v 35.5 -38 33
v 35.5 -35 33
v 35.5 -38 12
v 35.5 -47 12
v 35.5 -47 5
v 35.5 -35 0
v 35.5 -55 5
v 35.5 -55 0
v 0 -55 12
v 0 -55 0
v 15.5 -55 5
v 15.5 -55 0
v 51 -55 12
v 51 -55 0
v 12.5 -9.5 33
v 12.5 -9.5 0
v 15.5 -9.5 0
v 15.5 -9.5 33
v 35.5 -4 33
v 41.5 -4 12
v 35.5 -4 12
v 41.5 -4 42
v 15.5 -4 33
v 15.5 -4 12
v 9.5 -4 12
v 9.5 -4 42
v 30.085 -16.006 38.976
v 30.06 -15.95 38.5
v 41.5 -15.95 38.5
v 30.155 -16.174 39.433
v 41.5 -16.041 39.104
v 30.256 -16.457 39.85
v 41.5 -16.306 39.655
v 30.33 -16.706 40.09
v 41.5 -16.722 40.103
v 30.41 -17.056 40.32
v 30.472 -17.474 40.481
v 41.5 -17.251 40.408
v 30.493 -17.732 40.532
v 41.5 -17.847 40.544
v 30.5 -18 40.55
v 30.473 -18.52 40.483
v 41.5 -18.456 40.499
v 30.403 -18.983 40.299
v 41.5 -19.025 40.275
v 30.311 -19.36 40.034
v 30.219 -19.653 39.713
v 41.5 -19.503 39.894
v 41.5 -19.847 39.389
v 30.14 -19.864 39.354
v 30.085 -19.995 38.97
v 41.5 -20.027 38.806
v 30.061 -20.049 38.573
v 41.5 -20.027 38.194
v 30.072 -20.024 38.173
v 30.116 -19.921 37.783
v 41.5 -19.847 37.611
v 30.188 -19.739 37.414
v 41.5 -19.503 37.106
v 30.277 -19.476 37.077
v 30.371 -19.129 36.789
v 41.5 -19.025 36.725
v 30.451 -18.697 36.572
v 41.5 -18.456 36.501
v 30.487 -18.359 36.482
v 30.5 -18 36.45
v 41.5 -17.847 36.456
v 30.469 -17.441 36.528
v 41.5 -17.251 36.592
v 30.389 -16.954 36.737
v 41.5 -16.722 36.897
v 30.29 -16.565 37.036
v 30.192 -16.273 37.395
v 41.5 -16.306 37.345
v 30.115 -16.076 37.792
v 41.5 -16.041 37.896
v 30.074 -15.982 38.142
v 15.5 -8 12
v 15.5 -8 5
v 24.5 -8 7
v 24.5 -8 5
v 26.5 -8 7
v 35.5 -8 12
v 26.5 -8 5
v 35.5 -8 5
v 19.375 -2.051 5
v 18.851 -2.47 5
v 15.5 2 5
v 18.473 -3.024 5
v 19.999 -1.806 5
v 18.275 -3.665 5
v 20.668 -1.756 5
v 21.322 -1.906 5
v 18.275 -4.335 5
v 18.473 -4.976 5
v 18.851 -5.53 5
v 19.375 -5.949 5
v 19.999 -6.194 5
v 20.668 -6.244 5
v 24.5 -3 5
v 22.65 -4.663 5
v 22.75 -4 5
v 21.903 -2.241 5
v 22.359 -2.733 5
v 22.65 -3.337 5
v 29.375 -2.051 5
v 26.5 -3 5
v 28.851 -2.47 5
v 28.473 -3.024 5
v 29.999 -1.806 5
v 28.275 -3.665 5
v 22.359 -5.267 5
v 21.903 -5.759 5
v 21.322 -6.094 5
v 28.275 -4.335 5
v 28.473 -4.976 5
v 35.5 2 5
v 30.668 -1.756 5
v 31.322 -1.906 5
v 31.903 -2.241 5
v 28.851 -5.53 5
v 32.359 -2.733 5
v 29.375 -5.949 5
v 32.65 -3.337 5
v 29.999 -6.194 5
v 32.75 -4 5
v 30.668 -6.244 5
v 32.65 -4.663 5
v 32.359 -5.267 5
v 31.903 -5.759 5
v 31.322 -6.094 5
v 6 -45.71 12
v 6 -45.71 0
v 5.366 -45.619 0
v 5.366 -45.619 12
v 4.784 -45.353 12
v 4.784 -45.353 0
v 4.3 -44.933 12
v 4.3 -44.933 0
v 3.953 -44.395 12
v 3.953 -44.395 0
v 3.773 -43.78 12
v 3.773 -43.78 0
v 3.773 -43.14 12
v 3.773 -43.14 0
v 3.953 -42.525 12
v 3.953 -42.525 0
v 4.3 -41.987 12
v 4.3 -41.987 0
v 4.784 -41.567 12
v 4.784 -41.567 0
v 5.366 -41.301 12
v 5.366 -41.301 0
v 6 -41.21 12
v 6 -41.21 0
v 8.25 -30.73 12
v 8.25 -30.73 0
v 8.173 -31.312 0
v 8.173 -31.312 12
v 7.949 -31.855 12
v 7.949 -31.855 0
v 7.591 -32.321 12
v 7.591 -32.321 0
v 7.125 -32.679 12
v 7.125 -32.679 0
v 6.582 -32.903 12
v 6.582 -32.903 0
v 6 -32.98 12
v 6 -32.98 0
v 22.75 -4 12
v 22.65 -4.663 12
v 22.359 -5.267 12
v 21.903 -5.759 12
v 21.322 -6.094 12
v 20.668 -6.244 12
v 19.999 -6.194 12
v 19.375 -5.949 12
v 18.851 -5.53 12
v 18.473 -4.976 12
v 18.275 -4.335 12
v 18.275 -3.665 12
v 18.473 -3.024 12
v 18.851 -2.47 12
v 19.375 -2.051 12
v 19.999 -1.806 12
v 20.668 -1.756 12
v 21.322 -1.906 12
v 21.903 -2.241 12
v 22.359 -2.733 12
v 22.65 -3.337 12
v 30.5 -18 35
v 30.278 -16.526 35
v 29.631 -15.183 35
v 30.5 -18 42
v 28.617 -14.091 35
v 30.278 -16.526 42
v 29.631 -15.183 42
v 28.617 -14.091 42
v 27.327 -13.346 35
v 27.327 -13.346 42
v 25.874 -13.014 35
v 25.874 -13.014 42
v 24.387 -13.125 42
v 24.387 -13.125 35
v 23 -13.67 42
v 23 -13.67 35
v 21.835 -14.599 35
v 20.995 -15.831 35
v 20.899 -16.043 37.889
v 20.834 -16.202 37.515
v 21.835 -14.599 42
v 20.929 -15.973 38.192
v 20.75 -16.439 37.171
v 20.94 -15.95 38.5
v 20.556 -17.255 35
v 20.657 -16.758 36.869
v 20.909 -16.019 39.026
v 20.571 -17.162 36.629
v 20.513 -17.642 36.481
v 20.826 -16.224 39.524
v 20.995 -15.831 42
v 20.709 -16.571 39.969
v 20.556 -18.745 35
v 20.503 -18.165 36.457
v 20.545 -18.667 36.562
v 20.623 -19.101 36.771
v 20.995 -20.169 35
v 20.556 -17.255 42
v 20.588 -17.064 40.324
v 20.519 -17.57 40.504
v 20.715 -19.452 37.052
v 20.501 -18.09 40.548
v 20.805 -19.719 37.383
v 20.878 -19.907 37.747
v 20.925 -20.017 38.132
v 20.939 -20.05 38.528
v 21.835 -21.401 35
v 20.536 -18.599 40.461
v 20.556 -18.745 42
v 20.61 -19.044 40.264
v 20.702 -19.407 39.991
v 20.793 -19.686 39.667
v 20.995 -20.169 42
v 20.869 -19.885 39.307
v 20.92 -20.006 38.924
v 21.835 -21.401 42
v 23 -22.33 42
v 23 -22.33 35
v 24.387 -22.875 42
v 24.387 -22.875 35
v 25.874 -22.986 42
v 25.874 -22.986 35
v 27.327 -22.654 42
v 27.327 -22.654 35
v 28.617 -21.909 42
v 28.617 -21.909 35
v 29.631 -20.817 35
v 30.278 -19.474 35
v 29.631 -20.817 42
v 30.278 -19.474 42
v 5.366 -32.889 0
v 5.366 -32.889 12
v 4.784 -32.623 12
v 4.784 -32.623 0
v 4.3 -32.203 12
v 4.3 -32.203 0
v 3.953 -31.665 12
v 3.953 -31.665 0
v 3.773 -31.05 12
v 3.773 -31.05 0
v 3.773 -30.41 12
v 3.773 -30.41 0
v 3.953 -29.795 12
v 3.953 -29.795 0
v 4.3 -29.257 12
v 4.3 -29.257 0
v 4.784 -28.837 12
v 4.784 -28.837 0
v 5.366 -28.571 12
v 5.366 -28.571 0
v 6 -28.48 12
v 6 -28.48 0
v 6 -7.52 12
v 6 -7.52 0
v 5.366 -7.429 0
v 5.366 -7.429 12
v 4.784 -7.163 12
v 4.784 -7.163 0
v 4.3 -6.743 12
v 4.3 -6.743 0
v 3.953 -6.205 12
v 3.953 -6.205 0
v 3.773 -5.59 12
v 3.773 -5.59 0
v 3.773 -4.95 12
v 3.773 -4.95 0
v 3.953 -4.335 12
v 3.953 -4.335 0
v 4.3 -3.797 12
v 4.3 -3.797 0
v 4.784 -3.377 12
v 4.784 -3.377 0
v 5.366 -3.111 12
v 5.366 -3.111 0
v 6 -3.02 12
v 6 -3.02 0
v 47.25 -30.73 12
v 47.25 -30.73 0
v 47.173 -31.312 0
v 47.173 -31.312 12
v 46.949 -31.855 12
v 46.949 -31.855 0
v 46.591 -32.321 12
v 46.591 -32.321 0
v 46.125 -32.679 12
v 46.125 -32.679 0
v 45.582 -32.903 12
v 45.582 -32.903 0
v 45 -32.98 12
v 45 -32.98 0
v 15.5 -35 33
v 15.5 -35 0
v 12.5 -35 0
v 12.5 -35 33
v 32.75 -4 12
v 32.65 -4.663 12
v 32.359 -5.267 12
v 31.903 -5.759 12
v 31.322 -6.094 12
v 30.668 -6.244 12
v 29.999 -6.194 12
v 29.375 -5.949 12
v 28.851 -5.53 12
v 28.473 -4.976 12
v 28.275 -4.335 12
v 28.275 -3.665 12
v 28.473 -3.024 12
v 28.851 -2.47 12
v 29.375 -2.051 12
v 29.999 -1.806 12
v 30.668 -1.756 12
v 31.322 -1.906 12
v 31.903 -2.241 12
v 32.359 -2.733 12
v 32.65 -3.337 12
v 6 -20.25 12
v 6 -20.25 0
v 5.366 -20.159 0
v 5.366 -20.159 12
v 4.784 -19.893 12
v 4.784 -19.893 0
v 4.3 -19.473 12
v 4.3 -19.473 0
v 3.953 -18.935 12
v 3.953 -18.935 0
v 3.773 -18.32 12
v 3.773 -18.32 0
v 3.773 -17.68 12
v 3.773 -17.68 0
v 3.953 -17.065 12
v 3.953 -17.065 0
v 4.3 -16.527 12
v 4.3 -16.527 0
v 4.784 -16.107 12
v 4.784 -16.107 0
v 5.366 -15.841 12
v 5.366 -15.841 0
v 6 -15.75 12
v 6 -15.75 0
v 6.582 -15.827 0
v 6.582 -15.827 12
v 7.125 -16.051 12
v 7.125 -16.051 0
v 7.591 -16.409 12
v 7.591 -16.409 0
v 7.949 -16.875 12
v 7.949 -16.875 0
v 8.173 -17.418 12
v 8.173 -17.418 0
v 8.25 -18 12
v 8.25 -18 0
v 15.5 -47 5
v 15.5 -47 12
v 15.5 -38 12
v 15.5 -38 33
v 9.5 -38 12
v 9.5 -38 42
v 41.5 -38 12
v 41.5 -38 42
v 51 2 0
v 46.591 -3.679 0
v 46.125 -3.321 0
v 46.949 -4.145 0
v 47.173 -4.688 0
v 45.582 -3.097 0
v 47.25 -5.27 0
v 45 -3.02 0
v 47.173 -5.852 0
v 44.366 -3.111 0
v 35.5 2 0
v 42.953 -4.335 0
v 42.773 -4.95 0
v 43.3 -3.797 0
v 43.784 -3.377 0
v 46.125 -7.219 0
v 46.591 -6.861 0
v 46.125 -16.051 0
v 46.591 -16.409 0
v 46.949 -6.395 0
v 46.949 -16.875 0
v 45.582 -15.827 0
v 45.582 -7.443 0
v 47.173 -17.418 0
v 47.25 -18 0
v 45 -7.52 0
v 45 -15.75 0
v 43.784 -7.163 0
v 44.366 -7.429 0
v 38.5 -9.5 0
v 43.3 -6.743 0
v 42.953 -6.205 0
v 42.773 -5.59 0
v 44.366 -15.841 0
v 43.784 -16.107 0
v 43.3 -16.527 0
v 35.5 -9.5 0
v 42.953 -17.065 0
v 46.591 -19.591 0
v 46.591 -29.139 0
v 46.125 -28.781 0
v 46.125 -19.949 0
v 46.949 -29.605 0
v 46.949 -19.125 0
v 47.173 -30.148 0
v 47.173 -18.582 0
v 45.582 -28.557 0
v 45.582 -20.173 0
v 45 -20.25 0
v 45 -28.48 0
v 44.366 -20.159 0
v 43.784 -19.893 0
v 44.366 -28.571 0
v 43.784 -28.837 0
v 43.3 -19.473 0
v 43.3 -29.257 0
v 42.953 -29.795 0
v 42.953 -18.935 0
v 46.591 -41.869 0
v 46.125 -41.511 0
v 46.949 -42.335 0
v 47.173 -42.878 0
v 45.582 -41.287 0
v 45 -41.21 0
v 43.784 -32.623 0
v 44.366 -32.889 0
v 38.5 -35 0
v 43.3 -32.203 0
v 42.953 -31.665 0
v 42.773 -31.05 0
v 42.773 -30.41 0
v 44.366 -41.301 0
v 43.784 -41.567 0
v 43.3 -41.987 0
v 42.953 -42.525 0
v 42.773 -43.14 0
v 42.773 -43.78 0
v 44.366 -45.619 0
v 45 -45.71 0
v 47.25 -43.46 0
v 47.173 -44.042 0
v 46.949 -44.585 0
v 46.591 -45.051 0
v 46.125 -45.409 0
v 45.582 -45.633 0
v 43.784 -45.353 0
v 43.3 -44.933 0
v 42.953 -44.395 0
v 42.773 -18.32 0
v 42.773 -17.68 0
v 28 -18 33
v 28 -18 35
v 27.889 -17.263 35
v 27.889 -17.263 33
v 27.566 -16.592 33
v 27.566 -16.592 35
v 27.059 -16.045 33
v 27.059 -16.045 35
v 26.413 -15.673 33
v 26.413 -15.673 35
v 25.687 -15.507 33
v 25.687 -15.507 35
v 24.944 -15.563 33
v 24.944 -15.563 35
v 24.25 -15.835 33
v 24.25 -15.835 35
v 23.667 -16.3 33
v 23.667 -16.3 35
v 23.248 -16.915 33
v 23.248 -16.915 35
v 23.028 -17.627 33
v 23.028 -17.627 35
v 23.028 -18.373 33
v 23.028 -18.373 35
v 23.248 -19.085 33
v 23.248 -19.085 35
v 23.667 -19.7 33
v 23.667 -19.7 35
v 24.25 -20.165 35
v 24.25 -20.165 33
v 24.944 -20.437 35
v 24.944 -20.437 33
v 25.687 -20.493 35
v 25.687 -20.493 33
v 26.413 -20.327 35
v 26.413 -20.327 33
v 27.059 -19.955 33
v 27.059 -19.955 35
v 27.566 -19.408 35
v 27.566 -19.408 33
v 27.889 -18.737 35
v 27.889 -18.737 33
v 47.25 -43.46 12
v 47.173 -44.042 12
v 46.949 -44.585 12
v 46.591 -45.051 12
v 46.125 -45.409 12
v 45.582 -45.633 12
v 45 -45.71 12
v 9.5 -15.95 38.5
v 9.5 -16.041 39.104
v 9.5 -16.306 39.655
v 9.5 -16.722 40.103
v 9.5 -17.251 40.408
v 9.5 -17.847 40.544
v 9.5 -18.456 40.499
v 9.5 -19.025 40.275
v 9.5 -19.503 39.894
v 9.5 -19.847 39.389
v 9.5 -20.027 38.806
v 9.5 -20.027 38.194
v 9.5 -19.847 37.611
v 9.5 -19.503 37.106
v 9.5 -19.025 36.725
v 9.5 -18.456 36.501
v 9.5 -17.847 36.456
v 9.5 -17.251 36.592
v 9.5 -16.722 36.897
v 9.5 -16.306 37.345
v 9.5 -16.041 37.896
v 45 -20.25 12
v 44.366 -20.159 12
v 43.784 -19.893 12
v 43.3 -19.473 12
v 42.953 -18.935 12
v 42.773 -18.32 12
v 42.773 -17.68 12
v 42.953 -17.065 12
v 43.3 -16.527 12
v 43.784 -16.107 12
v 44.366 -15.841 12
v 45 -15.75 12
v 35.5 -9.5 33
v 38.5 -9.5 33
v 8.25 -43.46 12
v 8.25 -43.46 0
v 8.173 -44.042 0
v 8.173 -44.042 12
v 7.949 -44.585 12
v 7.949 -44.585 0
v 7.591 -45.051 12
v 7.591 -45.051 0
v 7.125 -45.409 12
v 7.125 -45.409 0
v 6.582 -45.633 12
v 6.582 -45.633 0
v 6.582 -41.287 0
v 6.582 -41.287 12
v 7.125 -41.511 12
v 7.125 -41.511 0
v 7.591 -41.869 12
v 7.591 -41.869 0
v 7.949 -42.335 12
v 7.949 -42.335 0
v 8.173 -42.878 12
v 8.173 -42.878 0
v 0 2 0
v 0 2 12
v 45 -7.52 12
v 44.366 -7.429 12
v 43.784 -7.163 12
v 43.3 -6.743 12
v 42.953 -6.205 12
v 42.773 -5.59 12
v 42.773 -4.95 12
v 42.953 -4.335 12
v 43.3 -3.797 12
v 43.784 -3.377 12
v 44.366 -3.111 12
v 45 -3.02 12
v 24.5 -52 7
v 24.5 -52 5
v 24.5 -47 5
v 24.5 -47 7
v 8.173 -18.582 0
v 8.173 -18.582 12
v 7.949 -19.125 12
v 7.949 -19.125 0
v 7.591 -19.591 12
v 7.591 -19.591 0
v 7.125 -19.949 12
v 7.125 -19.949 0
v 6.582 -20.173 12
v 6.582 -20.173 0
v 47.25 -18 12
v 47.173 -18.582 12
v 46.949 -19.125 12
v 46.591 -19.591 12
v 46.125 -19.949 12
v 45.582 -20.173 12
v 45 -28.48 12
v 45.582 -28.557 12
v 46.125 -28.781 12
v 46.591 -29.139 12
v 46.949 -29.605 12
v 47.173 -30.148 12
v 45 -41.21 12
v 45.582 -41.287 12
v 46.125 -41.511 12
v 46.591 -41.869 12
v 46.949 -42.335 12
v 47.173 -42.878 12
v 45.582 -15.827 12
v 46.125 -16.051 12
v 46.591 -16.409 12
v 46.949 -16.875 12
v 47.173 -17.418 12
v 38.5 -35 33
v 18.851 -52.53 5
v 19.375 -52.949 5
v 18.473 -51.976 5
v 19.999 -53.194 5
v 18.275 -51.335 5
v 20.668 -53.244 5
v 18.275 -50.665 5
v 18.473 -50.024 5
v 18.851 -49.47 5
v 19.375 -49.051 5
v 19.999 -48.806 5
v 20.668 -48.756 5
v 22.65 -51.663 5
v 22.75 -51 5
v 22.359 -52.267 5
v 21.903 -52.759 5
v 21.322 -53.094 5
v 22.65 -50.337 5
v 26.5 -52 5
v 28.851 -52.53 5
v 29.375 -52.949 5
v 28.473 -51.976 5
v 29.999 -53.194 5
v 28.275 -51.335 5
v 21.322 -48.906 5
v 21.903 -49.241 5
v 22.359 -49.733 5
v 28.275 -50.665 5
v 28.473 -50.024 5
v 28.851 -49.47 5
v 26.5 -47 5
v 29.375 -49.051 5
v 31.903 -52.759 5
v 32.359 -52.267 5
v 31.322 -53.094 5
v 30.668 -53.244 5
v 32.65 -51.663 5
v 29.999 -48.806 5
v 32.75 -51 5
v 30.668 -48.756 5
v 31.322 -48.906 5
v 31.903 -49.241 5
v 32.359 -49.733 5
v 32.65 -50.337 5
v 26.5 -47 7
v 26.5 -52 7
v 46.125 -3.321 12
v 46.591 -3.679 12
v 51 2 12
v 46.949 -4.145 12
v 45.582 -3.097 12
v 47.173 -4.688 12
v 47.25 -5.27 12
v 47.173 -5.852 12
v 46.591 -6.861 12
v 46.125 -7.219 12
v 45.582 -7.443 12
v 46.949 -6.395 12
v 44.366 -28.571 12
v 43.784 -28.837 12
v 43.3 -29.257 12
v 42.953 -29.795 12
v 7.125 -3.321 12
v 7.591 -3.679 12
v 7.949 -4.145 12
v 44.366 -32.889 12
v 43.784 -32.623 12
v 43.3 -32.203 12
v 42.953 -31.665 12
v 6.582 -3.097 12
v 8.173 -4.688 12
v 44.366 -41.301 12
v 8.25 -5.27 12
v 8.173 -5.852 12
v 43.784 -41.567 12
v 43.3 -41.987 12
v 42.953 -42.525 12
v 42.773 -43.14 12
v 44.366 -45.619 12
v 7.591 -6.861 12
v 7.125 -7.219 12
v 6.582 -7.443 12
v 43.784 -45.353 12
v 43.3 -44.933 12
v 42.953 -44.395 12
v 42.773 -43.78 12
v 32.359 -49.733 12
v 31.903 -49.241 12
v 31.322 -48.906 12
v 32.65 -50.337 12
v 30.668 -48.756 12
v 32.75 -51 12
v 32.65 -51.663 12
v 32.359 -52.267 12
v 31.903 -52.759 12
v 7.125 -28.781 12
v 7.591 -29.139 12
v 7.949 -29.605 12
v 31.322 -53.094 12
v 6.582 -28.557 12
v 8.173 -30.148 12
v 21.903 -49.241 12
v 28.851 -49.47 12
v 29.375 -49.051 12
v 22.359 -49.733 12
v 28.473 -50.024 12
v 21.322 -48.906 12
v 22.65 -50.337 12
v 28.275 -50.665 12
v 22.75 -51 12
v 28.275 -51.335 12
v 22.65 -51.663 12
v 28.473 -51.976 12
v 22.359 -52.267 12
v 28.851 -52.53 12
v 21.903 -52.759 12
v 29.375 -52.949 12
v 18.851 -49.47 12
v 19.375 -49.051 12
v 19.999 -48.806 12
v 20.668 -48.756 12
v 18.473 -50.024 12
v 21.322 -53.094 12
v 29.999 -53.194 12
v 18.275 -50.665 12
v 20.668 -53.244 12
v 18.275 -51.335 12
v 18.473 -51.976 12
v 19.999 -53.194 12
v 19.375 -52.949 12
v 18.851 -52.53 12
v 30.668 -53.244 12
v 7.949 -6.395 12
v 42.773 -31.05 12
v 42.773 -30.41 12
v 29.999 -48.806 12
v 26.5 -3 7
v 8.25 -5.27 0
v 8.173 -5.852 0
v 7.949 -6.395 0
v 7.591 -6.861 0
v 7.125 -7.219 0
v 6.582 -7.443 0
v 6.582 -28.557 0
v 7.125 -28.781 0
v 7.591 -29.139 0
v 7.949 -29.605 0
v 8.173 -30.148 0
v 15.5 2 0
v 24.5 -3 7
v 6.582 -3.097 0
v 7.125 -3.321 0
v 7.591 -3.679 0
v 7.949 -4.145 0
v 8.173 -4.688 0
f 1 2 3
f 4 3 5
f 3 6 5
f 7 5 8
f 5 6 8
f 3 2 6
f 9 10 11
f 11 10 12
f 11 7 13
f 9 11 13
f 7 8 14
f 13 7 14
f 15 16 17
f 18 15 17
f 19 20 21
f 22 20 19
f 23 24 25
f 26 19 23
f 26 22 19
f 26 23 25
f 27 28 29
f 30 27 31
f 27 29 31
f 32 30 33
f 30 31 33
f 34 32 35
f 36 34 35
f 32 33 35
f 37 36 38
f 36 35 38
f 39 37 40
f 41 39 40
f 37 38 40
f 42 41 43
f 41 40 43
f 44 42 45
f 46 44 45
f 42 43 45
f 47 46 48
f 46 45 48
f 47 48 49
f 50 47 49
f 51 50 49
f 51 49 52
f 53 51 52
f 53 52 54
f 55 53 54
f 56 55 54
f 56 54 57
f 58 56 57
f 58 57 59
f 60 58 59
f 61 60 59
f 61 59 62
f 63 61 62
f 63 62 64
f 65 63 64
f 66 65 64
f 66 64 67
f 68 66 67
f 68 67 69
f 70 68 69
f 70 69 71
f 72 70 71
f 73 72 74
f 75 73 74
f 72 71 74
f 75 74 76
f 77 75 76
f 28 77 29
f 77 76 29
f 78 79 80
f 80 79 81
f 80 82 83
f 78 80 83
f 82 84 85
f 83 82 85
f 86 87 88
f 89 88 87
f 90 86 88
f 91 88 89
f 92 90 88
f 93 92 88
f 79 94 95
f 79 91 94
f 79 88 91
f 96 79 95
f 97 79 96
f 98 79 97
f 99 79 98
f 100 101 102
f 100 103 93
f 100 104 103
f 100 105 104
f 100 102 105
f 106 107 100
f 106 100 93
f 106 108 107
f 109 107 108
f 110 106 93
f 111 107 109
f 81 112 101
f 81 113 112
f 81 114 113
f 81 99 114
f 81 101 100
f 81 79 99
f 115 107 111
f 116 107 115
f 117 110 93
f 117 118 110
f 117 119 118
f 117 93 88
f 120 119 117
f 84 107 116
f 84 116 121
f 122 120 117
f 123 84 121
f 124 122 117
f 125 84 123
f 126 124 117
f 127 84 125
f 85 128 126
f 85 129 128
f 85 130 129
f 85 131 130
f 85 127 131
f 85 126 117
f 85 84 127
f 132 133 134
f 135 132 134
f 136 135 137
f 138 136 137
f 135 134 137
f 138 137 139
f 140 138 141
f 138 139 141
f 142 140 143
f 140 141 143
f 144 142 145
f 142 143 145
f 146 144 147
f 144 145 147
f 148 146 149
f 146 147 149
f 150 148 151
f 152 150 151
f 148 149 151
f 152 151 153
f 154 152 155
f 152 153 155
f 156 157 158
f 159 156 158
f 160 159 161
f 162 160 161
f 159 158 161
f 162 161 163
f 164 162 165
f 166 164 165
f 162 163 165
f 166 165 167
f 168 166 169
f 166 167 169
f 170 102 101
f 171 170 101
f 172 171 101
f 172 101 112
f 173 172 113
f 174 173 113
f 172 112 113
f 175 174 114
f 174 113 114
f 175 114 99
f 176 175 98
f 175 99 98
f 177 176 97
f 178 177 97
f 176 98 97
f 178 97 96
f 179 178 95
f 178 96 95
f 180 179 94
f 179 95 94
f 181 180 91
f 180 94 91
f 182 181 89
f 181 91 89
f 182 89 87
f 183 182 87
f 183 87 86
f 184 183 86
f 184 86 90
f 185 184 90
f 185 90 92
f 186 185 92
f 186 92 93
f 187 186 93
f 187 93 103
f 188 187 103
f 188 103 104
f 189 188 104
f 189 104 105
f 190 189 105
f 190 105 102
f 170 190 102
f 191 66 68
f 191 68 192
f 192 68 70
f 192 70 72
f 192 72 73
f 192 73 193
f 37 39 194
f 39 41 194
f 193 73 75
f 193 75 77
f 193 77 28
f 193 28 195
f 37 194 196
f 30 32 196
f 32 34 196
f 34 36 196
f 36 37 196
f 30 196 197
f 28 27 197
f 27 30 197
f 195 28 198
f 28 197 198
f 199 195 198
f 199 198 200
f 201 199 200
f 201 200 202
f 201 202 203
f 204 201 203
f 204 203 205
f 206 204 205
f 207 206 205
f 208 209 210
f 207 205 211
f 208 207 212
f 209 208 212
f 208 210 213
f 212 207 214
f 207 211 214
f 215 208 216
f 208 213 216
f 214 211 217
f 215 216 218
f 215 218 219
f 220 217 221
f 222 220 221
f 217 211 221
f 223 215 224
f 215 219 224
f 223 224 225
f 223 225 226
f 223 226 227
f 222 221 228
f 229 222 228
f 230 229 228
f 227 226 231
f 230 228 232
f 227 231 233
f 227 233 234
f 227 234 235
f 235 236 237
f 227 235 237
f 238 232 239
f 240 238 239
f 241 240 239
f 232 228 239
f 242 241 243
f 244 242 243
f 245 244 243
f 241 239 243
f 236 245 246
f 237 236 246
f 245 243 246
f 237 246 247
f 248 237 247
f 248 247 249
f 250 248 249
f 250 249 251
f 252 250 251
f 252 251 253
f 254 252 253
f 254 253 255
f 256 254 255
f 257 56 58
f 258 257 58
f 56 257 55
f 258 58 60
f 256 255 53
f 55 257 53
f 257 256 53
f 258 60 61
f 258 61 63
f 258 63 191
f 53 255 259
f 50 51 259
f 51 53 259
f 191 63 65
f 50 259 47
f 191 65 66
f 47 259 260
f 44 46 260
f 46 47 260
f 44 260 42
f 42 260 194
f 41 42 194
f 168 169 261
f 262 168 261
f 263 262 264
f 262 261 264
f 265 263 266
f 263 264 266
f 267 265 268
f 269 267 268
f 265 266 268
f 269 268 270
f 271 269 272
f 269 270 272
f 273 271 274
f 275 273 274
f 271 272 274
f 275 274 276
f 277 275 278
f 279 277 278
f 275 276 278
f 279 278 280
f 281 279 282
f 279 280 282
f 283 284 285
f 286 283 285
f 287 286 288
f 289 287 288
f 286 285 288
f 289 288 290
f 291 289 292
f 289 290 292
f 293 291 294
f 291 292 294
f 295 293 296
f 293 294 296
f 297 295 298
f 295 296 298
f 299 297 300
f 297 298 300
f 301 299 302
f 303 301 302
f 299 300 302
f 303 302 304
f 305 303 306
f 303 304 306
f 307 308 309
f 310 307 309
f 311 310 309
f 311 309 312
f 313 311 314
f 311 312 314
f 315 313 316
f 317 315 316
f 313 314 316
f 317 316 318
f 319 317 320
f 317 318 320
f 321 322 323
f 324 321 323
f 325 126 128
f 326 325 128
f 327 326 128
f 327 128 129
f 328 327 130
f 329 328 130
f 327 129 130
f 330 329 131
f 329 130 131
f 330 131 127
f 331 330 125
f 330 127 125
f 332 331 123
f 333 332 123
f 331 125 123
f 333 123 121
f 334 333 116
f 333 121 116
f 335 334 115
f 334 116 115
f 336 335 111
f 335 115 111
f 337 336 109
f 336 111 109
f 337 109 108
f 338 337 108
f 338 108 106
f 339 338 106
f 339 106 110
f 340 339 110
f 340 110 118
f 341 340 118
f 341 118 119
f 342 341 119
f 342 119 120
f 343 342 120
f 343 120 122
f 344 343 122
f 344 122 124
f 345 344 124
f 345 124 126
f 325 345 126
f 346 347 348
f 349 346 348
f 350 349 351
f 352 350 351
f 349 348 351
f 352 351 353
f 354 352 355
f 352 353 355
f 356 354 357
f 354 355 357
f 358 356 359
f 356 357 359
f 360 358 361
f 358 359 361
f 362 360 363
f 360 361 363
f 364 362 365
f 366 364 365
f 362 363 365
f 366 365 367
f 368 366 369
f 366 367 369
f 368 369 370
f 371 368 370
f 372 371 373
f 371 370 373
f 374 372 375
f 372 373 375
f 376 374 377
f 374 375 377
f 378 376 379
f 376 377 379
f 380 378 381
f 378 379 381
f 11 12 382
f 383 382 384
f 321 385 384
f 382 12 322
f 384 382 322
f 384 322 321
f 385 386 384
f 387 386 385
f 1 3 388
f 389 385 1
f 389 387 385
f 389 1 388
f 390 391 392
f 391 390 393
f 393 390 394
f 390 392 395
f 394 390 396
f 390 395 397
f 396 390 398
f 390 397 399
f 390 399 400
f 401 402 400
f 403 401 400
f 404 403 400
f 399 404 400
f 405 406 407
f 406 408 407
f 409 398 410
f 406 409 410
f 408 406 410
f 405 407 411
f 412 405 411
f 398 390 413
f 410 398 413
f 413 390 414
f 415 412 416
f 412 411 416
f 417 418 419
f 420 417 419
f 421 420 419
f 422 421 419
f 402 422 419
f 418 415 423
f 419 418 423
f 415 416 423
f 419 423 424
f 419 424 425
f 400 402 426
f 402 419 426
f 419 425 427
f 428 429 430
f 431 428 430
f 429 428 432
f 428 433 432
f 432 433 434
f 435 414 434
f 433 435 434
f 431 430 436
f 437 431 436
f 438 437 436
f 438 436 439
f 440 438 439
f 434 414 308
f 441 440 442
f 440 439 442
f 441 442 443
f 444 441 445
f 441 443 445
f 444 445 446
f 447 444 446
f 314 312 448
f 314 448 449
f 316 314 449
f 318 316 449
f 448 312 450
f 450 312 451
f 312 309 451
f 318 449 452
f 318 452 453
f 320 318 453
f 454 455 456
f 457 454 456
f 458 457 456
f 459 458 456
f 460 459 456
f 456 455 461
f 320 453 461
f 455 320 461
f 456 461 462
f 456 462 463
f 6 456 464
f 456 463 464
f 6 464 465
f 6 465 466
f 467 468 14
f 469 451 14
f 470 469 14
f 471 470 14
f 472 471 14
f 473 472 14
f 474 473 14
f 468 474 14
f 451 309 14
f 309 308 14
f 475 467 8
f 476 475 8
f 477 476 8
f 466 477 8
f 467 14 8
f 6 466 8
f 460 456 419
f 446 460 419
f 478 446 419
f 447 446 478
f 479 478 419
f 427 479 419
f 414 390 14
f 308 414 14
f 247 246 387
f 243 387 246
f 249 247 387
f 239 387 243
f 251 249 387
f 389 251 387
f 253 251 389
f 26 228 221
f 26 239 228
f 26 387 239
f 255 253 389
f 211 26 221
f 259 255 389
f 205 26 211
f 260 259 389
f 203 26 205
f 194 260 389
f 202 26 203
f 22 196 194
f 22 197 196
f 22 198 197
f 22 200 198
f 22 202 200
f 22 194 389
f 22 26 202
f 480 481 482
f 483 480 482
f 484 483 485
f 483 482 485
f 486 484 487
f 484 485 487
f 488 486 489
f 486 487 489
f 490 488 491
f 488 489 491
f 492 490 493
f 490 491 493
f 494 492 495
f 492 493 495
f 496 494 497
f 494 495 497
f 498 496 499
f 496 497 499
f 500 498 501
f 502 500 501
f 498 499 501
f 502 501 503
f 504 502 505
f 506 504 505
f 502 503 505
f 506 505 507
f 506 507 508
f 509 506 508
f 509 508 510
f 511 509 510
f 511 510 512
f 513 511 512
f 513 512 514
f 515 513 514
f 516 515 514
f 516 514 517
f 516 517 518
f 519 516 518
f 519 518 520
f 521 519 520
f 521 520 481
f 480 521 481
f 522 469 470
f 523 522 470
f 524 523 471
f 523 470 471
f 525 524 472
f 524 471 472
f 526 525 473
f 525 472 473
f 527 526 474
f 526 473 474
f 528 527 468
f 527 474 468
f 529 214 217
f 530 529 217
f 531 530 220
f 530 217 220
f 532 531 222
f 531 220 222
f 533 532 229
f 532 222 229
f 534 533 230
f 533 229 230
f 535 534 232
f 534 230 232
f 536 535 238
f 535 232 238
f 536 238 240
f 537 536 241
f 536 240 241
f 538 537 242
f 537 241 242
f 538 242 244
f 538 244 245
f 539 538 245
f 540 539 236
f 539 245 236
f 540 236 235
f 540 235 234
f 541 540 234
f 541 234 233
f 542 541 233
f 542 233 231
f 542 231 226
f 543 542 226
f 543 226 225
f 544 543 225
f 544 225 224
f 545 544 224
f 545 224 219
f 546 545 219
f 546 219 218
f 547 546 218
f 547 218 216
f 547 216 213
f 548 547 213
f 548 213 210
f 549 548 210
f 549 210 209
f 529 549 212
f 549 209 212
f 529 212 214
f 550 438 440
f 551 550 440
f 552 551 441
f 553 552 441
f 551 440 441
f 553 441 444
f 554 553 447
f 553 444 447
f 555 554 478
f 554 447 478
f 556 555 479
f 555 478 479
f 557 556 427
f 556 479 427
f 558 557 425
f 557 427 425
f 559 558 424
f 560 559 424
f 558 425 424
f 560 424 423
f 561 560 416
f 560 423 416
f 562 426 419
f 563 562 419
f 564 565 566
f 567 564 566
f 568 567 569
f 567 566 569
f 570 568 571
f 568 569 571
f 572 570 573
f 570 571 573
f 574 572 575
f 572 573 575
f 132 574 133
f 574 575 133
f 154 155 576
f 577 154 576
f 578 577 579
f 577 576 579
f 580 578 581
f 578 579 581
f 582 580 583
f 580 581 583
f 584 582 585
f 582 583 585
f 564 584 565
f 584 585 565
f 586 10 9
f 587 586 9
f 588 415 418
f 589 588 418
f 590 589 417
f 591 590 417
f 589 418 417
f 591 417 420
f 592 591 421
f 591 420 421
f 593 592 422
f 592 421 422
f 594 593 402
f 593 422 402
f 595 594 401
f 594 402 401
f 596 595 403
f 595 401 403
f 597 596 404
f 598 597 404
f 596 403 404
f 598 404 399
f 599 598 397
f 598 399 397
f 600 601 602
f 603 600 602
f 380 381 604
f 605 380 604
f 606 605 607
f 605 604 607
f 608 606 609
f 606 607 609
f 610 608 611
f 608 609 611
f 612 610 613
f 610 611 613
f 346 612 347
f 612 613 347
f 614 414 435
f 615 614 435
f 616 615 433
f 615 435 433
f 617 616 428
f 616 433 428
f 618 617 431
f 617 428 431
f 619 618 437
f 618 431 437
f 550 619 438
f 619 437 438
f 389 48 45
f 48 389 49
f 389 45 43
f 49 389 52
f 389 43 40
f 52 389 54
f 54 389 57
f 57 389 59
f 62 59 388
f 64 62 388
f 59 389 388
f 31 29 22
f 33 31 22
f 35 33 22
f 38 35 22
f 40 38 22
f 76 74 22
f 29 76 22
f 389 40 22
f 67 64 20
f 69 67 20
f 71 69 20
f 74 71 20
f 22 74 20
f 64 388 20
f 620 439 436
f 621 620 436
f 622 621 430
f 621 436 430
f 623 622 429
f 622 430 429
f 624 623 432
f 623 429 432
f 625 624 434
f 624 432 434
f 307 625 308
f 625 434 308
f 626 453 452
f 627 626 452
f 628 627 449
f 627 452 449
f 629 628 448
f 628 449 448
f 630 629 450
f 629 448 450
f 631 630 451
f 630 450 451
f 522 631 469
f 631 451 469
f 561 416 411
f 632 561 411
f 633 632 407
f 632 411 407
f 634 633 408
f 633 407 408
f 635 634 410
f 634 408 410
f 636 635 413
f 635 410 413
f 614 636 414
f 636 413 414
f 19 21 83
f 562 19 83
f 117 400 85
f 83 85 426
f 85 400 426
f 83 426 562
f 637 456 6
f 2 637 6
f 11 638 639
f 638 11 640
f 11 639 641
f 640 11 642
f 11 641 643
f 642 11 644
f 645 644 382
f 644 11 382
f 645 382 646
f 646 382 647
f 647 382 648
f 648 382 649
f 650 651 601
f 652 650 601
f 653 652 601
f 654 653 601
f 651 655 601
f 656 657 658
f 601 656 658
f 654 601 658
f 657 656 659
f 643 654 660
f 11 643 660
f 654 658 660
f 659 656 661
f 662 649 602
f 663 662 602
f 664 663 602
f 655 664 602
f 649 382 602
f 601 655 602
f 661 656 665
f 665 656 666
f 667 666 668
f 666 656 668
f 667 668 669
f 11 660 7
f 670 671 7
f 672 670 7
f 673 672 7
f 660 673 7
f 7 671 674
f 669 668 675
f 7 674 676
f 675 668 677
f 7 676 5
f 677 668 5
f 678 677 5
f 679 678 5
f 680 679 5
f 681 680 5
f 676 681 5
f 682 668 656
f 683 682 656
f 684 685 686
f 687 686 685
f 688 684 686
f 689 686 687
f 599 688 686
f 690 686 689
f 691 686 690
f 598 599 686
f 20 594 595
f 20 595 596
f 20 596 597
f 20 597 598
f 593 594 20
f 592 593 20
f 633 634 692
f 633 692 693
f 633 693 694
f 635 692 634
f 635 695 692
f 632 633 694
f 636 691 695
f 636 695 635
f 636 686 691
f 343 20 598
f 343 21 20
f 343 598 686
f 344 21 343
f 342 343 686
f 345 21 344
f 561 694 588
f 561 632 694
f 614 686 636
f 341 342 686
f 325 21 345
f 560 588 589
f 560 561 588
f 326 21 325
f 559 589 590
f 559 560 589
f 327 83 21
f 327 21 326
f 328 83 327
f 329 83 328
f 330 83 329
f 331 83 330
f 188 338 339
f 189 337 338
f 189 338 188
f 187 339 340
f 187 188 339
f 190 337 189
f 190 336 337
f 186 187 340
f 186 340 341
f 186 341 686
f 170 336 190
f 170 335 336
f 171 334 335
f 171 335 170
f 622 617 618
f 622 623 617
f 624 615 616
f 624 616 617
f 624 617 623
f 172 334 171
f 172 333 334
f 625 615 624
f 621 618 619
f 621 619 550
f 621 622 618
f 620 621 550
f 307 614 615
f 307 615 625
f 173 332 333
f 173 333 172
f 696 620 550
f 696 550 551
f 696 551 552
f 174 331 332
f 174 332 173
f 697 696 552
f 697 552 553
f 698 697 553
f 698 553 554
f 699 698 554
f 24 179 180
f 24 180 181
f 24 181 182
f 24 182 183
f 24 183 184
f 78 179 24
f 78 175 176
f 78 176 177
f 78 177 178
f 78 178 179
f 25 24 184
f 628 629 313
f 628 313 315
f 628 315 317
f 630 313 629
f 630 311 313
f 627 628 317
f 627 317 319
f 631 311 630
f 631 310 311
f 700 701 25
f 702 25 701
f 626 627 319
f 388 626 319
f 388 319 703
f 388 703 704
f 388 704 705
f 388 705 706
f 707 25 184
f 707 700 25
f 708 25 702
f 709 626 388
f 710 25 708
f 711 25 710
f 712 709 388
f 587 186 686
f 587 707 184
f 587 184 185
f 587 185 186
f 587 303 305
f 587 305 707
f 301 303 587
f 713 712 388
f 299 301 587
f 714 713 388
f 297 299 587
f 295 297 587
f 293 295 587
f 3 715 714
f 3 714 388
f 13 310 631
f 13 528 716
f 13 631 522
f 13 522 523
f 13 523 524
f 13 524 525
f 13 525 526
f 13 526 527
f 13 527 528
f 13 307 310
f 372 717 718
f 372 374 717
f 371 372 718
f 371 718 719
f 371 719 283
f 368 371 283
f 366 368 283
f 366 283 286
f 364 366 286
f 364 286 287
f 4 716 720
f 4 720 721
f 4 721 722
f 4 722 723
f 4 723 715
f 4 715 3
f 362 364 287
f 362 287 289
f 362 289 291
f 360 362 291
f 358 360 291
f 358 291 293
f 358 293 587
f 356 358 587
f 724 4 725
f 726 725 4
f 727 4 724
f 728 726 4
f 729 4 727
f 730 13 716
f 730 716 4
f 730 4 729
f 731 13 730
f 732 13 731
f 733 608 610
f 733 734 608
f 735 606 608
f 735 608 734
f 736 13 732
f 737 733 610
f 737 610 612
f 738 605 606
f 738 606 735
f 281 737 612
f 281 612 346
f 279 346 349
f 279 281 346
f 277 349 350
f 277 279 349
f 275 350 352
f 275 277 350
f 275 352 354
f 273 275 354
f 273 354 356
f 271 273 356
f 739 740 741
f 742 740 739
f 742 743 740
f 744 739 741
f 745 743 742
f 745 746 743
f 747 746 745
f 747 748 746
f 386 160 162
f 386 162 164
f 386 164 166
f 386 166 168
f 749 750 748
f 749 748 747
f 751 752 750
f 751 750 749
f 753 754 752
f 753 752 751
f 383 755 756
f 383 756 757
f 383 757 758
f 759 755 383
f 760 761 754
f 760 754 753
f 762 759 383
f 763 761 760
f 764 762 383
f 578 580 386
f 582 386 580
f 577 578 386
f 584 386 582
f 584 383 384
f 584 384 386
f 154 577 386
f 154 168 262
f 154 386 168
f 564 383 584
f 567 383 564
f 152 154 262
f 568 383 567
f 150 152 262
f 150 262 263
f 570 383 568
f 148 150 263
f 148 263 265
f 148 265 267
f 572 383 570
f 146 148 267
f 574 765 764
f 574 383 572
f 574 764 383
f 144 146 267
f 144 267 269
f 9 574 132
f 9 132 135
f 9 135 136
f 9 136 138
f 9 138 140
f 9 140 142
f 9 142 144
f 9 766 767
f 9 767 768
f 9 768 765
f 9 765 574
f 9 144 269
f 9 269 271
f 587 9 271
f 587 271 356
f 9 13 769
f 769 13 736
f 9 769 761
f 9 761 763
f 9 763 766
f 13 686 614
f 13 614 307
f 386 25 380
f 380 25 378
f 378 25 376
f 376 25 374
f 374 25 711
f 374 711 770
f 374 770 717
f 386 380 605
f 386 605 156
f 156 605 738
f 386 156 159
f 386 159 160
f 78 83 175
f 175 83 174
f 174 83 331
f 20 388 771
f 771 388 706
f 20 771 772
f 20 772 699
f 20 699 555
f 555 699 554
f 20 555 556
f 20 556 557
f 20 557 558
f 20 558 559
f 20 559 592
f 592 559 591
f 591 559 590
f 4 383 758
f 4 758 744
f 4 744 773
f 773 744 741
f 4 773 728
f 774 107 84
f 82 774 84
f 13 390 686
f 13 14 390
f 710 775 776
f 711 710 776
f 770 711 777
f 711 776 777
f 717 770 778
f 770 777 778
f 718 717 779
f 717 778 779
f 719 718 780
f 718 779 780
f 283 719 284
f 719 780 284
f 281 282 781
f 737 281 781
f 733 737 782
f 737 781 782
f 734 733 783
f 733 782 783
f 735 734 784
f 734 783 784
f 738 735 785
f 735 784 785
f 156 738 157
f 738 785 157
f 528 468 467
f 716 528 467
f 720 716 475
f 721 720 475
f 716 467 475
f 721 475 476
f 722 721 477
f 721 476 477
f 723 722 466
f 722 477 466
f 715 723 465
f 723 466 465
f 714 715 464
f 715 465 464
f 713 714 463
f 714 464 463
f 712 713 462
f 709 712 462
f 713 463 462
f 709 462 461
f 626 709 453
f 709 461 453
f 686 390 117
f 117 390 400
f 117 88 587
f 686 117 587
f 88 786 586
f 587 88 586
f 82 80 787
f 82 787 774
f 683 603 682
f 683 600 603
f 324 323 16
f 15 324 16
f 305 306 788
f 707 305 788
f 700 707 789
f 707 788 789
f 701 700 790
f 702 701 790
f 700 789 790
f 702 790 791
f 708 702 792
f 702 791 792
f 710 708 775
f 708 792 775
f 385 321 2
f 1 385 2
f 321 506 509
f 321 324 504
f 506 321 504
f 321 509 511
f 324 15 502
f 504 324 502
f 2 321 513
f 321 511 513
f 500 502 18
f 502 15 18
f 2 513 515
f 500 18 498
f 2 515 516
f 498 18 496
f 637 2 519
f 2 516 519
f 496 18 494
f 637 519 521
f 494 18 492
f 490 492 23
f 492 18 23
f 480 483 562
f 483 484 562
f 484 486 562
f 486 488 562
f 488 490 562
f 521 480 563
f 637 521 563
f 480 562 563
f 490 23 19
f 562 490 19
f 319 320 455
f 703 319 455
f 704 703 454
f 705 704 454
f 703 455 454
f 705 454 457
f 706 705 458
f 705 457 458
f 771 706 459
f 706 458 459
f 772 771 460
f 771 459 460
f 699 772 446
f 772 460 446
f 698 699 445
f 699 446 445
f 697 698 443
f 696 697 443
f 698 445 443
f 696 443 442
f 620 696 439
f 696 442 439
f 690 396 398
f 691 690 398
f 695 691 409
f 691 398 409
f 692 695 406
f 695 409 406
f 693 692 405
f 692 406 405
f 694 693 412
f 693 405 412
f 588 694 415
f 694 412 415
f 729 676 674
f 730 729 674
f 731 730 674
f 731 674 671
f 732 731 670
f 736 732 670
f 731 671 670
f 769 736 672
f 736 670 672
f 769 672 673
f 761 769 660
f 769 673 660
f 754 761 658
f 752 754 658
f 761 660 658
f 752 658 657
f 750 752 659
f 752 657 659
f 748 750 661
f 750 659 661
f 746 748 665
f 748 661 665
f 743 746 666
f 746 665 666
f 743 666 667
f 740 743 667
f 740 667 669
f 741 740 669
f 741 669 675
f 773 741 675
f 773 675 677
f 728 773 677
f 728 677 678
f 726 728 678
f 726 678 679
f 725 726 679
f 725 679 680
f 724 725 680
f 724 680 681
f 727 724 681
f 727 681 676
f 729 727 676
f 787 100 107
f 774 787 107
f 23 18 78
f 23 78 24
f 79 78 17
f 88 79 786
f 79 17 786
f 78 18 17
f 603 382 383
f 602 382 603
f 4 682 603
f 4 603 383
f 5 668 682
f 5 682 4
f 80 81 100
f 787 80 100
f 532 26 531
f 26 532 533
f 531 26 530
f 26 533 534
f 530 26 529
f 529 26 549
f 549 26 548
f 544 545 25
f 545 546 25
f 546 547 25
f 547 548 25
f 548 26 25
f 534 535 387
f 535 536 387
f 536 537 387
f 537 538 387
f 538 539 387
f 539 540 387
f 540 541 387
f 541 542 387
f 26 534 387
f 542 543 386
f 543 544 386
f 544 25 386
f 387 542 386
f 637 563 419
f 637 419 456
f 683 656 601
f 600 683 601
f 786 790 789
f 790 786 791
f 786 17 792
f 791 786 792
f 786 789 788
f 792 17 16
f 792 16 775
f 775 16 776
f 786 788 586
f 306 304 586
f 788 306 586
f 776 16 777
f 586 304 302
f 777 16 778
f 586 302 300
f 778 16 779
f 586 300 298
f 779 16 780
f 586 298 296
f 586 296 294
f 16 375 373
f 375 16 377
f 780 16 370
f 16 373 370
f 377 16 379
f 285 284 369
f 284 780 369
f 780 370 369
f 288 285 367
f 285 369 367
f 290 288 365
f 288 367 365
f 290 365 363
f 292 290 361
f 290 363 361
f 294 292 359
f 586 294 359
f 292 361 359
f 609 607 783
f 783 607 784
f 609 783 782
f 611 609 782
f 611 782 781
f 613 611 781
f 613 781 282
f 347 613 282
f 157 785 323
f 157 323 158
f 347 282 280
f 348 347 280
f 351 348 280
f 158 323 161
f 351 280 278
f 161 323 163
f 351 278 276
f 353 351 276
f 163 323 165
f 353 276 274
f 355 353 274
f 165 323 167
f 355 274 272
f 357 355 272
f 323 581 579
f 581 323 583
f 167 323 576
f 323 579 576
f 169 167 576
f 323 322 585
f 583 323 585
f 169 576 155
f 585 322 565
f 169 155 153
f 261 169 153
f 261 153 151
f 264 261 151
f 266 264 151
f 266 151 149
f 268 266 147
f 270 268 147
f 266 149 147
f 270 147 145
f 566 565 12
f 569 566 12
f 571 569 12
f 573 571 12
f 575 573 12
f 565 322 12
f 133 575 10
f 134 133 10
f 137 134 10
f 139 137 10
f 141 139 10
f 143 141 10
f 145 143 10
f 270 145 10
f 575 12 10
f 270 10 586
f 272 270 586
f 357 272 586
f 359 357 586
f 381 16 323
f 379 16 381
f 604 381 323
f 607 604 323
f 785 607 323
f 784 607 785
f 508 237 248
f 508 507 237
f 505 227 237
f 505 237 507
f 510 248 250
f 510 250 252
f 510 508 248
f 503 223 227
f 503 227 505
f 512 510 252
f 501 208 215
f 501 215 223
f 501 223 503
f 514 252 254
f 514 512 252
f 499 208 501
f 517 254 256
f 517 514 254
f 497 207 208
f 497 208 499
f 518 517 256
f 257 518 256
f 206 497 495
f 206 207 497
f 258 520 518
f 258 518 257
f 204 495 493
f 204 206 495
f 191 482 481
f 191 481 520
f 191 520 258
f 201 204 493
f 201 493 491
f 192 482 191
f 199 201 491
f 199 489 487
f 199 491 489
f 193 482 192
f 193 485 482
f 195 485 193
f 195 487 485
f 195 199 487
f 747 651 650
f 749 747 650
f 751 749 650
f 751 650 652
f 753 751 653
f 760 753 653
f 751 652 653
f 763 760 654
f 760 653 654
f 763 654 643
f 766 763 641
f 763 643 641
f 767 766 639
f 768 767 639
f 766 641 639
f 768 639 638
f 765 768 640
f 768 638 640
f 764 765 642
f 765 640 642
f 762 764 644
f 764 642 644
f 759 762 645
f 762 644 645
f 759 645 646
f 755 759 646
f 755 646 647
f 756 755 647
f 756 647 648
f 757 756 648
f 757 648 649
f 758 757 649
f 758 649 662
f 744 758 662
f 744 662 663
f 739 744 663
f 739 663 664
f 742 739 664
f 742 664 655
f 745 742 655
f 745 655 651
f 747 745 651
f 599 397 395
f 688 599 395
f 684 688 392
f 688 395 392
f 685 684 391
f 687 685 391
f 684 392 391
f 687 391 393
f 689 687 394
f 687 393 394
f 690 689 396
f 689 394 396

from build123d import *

# Parameters (mm, degrees)
F0_W      = 20
F0_H      = 8
F1_DEPTH  = 12
F2_DEPTH  = 5
F3_DEPTH  = 5
F5_DEPTH  = 2
F4_R      = 2.25
F6_DEPTH  = 25
F8_DEPTH  = 2
F7_R      = 2.25
F9_DEPTH  = 25
F11_DEPTH = 30
F12_W     = 6
F12_H     = 30
F13_DEPTH = 4
F14_W     = 6
F14_H     = 30
F15_DEPTH = 4
F16_W     = 32
F16_H     = 47
F17_DEPTH = 9
F18_R     = 5
F18_R_2   = 2.5
F19_DEPTH = 7
F20_DEPTH = 25
F21_R     = 2.05
F22_DEPTH = 58
F23_DEPTH = 13
F24_DEPTH = 2


with BuildPart() as f1:
    # F0 (on Top) → F1 (new body)
    with BuildSketch(Plane.XY):
        with Locations((25.5, -4)):
            Rectangle(F0_W, F0_H)
        with Locations((25.5, -51)):
            Rectangle(F0_W, F0_H)
        with BuildLine():
            Line((6, 0), (0, 0))
            Line((0, 0), (0, -55))
            Line((0, -55), (6, -55))
            Line((6, -55), (6, -45.71))
            ThreePointArc((6, -45.71), (3.75, -43.46), (6, -41.21))
            Line((6, -41.21), (6, -32.98))
            ThreePointArc((6, -32.98), (3.75, -30.73), (6, -28.48))
            Line((6, -28.48), (6, -20.25))
            ThreePointArc((6, -20.25), (3.75, -18), (6, -15.75))
            Line((6, -15.75), (6, -7.52))
            ThreePointArc((6, -7.52), (3.75, -5.27), (6, -3.02))
            Line((6, -3.02), (6, 0))
        make_face()
        with BuildLine():
            Line((51, 0), (45, 0))
            Line((45, 0), (45, -3.02))
            ThreePointArc((45, -3.02), (46.5909902577, -3.6790097423), (47.25, -5.27))
            ThreePointArc((47.25, -5.27), (46.5909902577, -6.8609902577), (45, -7.52))
            Line((45, -7.52), (45, -15.75))
            ThreePointArc((45, -15.75), (46.5909902577, -16.4090097423), (47.25, -18))
            ThreePointArc((47.25, -18), (46.5909902577, -19.5909902577), (45, -20.25))
            Line((45, -20.25), (45, -28.48))
            ThreePointArc((45, -28.48), (46.5909902577, -29.1390097423), (47.25, -30.73))
            ThreePointArc((47.25, -30.73), (46.5909902577, -32.3209902577), (45, -32.98))
            Line((45, -32.98), (45, -41.21))
            ThreePointArc((45, -41.21), (46.5909902577, -41.8690097423), (47.25, -43.46))
            ThreePointArc((47.25, -43.46), (46.5909902577, -45.0509902577), (45, -45.71))
            Line((45, -45.71), (45, -55))
            Line((45, -55), (51, -55))
            Line((51, -55), (51, 0))
        make_face()
        with BuildLine():
            Line((15.5, 0), (6, 0))
            Line((6, 0), (6, -3.02))
            ThreePointArc((6, -3.02), (7.5909902577, -3.6790097423), (8.25, -5.27))
            ThreePointArc((8.25, -5.27), (7.5909902577, -6.8609902577), (6, -7.52))
            Line((6, -7.52), (6, -15.75))
            ThreePointArc((6, -15.75), (7.5909902577, -16.4090097423), (8.25, -18))
            ThreePointArc((8.25, -18), (7.5909902577, -19.5909902577), (6, -20.25))
            Line((6, -20.25), (6, -28.48))
            ThreePointArc((6, -28.48), (7.5909902577, -29.1390097423), (8.25, -30.73))
            ThreePointArc((8.25, -30.73), (7.5909902577, -32.3209902577), (6, -32.98))
            Line((6, -32.98), (6, -41.21))
            ThreePointArc((6, -41.21), (7.5909902577, -41.8690097423), (8.25, -43.46))
            ThreePointArc((8.25, -43.46), (7.5909902577, -45.0509902577), (6, -45.71))
            Line((6, -45.71), (6, -55))
            Line((6, -55), (15.5, -55))
            Line((15.5, -55), (15.5, -47))
            Line((15.5, -47), (15.5, -35))
            Line((15.5, -35), (12.5, -35))
            Line((12.5, -35), (12.5, -9.5))
            Line((12.5, -9.5), (15.5, -9.5))
            Line((15.5, -9.5), (15.5, -8))
            Line((15.5, -8), (15.5, 0))
        make_face()
        with BuildLine():
            Line((45, 0), (35.5, 0))
            Line((35.5, 0), (35.5, -8))
            Line((35.5, -8), (35.5, -9.5))
            Line((35.5, -9.5), (38.5, -9.5))
            Line((38.5, -9.5), (38.5, -35))
            Line((38.5, -35), (35.5, -35))
            Line((35.5, -35), (35.5, -47))
            Line((35.5, -47), (35.5, -55))
            Line((35.5, -55), (45, -55))
            Line((45, -55), (45, -45.71))
            ThreePointArc((45, -45.71), (42.75, -43.46), (45, -41.21))
            Line((45, -41.21), (45, -32.98))
            ThreePointArc((45, -32.98), (42.75, -30.73), (45, -28.48))
            Line((45, -28.48), (45, -20.25))
            ThreePointArc((45, -20.25), (42.75, -18), (45, -15.75))
            Line((45, -15.75), (45, -7.52))
            ThreePointArc((45, -7.52), (42.75, -5.27), (45, -3.02))
            Line((45, -3.02), (45, 0))
        make_face()
    extrude(amount=F1_DEPTH)

    # F0 (on Top) → F2 (cut)
    with BuildSketch(Plane.XY):
        with Locations((25.5, -51)):
            Rectangle(F0_W, F0_H)
    extrude(amount=F2_DEPTH, mode=Mode.SUBTRACT)

    # F0 (on Top) → F3 (cut)
    with BuildSketch(Plane.XY):
        with Locations((25.5, -4)):
            Rectangle(F0_W, F0_H)
    extrude(amount=F3_DEPTH, mode=Mode.SUBTRACT)

    # F4 (on face) → F5 (cut)
    with BuildSketch(Plane(origin=(0, 0, 5), x_dir=(1, 0, 0), z_dir=(0, 0, -1))):
        Polygon((24.5, 47), (25.5, 47), (26.5, 47), (26.5, 52), (24.5, 52), align=None)
    extrude(amount=-F5_DEPTH, mode=Mode.SUBTRACT)

    # F4 (on face) → F6 (cut)
    with BuildSketch(Plane(origin=(0, 0, 5), x_dir=(1, 0, 0), z_dir=(0, 0, -1))):
        with Locations((20.5, 51)):
            Circle(F4_R)
        with Locations((30.5, 51)):
            Circle(F4_R)
    extrude(amount=-F6_DEPTH, mode=Mode.SUBTRACT)

    # F7 (on face) → F8 (cut)
    with BuildSketch(Plane(origin=(0, 0, 5), x_dir=(1, 0, 0), z_dir=(0, 0, -1))):
        Polygon((26.5, 8), (25.5, 8), (24.5, 8), (24.5, 3), (26.5, 3), align=None)
    extrude(amount=-F8_DEPTH, mode=Mode.SUBTRACT)

    # F7 (on face) → F9 (cut)
    with BuildSketch(Plane(origin=(0, 0, 5), x_dir=(1, 0, 0), z_dir=(0, 0, -1))):
        with Locations((30.5, 4)):
            Circle(F7_R)
        with Locations((20.5, 4)):
            Circle(F7_R)
    extrude(amount=-F9_DEPTH, mode=Mode.SUBTRACT)

    # F10 (on face) → F11 (join)
    with BuildSketch(Plane.XY.offset(12)):
        Polygon((41.5, -55), (41.5, 0), (35.5, 0), (35.5, -8), (35.5, -9.5), (38.5, -9.5), (38.5, -35), (35.5, -35), (35.5, -47), (35.5, -55), align=None)
        Polygon((15.5, -8), (15.5, 0), (9.5, 0), (9.5, -55), (15.5, -55), (15.5, -47), (15.5, -35), (12.5, -35), (12.5, -9.5), (15.5, -9.5), align=None)
    extrude(amount=F11_DEPTH)

    # F12 (on face) → F13 (cut)
    with BuildSketch(Plane(origin=(0, 0, 0), x_dir=(-1, 0, 0), z_dir=(0, 1, 0))):
        with Locations((-38.5, 27)):
            Rectangle(F12_W, F12_H)
        with Locations((-12.5, 27)):
            Rectangle(F12_W, F12_H)
    extrude(amount=-F13_DEPTH, mode=Mode.SUBTRACT)

    # F14 (on face) → F15 (cut)
    with BuildSketch(Plane.XZ.offset(55)):
        with Locations((12.5, 27)):
            Rectangle(F14_W, F14_H)
        with Locations((38.5, 27)):
            Rectangle(F14_W, F14_H)
    extrude(amount=-F15_DEPTH, mode=Mode.SUBTRACT)

    # F16 (on face) → F17 (join)
    with BuildSketch(Plane.XY.offset(42)):
        with Locations((25.5, -27.5)):
            Rectangle(F16_W, F16_H)
    extrude(amount=-F17_DEPTH)

    # F18 (on face) → F19 (cut)
    with BuildSketch(Plane.XY.offset(42)):
        with Locations((25.5, -18)):
            Circle(F18_R)
        with Locations((25.5, -18)):
            Circle(F18_R_2, mode=Mode.SUBTRACT)
    extrude(amount=-F19_DEPTH, mode=Mode.SUBTRACT)

    # F20 (cut): a face of the model
    f20_faces = [f1.faces().sort_by_distance(p)[0] for p in [
        (25.5, -18, 42),
    ]]
    extrude(f20_faces, amount=-F20_DEPTH, mode=Mode.SUBTRACT)

    # F21 (on face) → F22 (cut)
    with BuildSketch(Plane.YZ.offset(41.5)):
        with Locations((-18, 38.5)):
            Circle(F21_R)
    extrude(amount=-F22_DEPTH, mode=Mode.SUBTRACT)

    # F23 (cut): a face of the model
    f23_faces = [f1.faces().sort_by_distance(p)[0] for p in [
        (41.061365756, -51, 27),
    ]]
    extrude(f23_faces, amount=-F23_DEPTH, mode=Mode.SUBTRACT)

    # F24 (add): a face of the model
    f24_faces = [f1.faces().sort_by_distance(p)[0] for p in [
        (25.5, 0, 6.68359375),
    ]]
    extrude(f24_faces, amount=F24_DEPTH)


solid = f1.part
